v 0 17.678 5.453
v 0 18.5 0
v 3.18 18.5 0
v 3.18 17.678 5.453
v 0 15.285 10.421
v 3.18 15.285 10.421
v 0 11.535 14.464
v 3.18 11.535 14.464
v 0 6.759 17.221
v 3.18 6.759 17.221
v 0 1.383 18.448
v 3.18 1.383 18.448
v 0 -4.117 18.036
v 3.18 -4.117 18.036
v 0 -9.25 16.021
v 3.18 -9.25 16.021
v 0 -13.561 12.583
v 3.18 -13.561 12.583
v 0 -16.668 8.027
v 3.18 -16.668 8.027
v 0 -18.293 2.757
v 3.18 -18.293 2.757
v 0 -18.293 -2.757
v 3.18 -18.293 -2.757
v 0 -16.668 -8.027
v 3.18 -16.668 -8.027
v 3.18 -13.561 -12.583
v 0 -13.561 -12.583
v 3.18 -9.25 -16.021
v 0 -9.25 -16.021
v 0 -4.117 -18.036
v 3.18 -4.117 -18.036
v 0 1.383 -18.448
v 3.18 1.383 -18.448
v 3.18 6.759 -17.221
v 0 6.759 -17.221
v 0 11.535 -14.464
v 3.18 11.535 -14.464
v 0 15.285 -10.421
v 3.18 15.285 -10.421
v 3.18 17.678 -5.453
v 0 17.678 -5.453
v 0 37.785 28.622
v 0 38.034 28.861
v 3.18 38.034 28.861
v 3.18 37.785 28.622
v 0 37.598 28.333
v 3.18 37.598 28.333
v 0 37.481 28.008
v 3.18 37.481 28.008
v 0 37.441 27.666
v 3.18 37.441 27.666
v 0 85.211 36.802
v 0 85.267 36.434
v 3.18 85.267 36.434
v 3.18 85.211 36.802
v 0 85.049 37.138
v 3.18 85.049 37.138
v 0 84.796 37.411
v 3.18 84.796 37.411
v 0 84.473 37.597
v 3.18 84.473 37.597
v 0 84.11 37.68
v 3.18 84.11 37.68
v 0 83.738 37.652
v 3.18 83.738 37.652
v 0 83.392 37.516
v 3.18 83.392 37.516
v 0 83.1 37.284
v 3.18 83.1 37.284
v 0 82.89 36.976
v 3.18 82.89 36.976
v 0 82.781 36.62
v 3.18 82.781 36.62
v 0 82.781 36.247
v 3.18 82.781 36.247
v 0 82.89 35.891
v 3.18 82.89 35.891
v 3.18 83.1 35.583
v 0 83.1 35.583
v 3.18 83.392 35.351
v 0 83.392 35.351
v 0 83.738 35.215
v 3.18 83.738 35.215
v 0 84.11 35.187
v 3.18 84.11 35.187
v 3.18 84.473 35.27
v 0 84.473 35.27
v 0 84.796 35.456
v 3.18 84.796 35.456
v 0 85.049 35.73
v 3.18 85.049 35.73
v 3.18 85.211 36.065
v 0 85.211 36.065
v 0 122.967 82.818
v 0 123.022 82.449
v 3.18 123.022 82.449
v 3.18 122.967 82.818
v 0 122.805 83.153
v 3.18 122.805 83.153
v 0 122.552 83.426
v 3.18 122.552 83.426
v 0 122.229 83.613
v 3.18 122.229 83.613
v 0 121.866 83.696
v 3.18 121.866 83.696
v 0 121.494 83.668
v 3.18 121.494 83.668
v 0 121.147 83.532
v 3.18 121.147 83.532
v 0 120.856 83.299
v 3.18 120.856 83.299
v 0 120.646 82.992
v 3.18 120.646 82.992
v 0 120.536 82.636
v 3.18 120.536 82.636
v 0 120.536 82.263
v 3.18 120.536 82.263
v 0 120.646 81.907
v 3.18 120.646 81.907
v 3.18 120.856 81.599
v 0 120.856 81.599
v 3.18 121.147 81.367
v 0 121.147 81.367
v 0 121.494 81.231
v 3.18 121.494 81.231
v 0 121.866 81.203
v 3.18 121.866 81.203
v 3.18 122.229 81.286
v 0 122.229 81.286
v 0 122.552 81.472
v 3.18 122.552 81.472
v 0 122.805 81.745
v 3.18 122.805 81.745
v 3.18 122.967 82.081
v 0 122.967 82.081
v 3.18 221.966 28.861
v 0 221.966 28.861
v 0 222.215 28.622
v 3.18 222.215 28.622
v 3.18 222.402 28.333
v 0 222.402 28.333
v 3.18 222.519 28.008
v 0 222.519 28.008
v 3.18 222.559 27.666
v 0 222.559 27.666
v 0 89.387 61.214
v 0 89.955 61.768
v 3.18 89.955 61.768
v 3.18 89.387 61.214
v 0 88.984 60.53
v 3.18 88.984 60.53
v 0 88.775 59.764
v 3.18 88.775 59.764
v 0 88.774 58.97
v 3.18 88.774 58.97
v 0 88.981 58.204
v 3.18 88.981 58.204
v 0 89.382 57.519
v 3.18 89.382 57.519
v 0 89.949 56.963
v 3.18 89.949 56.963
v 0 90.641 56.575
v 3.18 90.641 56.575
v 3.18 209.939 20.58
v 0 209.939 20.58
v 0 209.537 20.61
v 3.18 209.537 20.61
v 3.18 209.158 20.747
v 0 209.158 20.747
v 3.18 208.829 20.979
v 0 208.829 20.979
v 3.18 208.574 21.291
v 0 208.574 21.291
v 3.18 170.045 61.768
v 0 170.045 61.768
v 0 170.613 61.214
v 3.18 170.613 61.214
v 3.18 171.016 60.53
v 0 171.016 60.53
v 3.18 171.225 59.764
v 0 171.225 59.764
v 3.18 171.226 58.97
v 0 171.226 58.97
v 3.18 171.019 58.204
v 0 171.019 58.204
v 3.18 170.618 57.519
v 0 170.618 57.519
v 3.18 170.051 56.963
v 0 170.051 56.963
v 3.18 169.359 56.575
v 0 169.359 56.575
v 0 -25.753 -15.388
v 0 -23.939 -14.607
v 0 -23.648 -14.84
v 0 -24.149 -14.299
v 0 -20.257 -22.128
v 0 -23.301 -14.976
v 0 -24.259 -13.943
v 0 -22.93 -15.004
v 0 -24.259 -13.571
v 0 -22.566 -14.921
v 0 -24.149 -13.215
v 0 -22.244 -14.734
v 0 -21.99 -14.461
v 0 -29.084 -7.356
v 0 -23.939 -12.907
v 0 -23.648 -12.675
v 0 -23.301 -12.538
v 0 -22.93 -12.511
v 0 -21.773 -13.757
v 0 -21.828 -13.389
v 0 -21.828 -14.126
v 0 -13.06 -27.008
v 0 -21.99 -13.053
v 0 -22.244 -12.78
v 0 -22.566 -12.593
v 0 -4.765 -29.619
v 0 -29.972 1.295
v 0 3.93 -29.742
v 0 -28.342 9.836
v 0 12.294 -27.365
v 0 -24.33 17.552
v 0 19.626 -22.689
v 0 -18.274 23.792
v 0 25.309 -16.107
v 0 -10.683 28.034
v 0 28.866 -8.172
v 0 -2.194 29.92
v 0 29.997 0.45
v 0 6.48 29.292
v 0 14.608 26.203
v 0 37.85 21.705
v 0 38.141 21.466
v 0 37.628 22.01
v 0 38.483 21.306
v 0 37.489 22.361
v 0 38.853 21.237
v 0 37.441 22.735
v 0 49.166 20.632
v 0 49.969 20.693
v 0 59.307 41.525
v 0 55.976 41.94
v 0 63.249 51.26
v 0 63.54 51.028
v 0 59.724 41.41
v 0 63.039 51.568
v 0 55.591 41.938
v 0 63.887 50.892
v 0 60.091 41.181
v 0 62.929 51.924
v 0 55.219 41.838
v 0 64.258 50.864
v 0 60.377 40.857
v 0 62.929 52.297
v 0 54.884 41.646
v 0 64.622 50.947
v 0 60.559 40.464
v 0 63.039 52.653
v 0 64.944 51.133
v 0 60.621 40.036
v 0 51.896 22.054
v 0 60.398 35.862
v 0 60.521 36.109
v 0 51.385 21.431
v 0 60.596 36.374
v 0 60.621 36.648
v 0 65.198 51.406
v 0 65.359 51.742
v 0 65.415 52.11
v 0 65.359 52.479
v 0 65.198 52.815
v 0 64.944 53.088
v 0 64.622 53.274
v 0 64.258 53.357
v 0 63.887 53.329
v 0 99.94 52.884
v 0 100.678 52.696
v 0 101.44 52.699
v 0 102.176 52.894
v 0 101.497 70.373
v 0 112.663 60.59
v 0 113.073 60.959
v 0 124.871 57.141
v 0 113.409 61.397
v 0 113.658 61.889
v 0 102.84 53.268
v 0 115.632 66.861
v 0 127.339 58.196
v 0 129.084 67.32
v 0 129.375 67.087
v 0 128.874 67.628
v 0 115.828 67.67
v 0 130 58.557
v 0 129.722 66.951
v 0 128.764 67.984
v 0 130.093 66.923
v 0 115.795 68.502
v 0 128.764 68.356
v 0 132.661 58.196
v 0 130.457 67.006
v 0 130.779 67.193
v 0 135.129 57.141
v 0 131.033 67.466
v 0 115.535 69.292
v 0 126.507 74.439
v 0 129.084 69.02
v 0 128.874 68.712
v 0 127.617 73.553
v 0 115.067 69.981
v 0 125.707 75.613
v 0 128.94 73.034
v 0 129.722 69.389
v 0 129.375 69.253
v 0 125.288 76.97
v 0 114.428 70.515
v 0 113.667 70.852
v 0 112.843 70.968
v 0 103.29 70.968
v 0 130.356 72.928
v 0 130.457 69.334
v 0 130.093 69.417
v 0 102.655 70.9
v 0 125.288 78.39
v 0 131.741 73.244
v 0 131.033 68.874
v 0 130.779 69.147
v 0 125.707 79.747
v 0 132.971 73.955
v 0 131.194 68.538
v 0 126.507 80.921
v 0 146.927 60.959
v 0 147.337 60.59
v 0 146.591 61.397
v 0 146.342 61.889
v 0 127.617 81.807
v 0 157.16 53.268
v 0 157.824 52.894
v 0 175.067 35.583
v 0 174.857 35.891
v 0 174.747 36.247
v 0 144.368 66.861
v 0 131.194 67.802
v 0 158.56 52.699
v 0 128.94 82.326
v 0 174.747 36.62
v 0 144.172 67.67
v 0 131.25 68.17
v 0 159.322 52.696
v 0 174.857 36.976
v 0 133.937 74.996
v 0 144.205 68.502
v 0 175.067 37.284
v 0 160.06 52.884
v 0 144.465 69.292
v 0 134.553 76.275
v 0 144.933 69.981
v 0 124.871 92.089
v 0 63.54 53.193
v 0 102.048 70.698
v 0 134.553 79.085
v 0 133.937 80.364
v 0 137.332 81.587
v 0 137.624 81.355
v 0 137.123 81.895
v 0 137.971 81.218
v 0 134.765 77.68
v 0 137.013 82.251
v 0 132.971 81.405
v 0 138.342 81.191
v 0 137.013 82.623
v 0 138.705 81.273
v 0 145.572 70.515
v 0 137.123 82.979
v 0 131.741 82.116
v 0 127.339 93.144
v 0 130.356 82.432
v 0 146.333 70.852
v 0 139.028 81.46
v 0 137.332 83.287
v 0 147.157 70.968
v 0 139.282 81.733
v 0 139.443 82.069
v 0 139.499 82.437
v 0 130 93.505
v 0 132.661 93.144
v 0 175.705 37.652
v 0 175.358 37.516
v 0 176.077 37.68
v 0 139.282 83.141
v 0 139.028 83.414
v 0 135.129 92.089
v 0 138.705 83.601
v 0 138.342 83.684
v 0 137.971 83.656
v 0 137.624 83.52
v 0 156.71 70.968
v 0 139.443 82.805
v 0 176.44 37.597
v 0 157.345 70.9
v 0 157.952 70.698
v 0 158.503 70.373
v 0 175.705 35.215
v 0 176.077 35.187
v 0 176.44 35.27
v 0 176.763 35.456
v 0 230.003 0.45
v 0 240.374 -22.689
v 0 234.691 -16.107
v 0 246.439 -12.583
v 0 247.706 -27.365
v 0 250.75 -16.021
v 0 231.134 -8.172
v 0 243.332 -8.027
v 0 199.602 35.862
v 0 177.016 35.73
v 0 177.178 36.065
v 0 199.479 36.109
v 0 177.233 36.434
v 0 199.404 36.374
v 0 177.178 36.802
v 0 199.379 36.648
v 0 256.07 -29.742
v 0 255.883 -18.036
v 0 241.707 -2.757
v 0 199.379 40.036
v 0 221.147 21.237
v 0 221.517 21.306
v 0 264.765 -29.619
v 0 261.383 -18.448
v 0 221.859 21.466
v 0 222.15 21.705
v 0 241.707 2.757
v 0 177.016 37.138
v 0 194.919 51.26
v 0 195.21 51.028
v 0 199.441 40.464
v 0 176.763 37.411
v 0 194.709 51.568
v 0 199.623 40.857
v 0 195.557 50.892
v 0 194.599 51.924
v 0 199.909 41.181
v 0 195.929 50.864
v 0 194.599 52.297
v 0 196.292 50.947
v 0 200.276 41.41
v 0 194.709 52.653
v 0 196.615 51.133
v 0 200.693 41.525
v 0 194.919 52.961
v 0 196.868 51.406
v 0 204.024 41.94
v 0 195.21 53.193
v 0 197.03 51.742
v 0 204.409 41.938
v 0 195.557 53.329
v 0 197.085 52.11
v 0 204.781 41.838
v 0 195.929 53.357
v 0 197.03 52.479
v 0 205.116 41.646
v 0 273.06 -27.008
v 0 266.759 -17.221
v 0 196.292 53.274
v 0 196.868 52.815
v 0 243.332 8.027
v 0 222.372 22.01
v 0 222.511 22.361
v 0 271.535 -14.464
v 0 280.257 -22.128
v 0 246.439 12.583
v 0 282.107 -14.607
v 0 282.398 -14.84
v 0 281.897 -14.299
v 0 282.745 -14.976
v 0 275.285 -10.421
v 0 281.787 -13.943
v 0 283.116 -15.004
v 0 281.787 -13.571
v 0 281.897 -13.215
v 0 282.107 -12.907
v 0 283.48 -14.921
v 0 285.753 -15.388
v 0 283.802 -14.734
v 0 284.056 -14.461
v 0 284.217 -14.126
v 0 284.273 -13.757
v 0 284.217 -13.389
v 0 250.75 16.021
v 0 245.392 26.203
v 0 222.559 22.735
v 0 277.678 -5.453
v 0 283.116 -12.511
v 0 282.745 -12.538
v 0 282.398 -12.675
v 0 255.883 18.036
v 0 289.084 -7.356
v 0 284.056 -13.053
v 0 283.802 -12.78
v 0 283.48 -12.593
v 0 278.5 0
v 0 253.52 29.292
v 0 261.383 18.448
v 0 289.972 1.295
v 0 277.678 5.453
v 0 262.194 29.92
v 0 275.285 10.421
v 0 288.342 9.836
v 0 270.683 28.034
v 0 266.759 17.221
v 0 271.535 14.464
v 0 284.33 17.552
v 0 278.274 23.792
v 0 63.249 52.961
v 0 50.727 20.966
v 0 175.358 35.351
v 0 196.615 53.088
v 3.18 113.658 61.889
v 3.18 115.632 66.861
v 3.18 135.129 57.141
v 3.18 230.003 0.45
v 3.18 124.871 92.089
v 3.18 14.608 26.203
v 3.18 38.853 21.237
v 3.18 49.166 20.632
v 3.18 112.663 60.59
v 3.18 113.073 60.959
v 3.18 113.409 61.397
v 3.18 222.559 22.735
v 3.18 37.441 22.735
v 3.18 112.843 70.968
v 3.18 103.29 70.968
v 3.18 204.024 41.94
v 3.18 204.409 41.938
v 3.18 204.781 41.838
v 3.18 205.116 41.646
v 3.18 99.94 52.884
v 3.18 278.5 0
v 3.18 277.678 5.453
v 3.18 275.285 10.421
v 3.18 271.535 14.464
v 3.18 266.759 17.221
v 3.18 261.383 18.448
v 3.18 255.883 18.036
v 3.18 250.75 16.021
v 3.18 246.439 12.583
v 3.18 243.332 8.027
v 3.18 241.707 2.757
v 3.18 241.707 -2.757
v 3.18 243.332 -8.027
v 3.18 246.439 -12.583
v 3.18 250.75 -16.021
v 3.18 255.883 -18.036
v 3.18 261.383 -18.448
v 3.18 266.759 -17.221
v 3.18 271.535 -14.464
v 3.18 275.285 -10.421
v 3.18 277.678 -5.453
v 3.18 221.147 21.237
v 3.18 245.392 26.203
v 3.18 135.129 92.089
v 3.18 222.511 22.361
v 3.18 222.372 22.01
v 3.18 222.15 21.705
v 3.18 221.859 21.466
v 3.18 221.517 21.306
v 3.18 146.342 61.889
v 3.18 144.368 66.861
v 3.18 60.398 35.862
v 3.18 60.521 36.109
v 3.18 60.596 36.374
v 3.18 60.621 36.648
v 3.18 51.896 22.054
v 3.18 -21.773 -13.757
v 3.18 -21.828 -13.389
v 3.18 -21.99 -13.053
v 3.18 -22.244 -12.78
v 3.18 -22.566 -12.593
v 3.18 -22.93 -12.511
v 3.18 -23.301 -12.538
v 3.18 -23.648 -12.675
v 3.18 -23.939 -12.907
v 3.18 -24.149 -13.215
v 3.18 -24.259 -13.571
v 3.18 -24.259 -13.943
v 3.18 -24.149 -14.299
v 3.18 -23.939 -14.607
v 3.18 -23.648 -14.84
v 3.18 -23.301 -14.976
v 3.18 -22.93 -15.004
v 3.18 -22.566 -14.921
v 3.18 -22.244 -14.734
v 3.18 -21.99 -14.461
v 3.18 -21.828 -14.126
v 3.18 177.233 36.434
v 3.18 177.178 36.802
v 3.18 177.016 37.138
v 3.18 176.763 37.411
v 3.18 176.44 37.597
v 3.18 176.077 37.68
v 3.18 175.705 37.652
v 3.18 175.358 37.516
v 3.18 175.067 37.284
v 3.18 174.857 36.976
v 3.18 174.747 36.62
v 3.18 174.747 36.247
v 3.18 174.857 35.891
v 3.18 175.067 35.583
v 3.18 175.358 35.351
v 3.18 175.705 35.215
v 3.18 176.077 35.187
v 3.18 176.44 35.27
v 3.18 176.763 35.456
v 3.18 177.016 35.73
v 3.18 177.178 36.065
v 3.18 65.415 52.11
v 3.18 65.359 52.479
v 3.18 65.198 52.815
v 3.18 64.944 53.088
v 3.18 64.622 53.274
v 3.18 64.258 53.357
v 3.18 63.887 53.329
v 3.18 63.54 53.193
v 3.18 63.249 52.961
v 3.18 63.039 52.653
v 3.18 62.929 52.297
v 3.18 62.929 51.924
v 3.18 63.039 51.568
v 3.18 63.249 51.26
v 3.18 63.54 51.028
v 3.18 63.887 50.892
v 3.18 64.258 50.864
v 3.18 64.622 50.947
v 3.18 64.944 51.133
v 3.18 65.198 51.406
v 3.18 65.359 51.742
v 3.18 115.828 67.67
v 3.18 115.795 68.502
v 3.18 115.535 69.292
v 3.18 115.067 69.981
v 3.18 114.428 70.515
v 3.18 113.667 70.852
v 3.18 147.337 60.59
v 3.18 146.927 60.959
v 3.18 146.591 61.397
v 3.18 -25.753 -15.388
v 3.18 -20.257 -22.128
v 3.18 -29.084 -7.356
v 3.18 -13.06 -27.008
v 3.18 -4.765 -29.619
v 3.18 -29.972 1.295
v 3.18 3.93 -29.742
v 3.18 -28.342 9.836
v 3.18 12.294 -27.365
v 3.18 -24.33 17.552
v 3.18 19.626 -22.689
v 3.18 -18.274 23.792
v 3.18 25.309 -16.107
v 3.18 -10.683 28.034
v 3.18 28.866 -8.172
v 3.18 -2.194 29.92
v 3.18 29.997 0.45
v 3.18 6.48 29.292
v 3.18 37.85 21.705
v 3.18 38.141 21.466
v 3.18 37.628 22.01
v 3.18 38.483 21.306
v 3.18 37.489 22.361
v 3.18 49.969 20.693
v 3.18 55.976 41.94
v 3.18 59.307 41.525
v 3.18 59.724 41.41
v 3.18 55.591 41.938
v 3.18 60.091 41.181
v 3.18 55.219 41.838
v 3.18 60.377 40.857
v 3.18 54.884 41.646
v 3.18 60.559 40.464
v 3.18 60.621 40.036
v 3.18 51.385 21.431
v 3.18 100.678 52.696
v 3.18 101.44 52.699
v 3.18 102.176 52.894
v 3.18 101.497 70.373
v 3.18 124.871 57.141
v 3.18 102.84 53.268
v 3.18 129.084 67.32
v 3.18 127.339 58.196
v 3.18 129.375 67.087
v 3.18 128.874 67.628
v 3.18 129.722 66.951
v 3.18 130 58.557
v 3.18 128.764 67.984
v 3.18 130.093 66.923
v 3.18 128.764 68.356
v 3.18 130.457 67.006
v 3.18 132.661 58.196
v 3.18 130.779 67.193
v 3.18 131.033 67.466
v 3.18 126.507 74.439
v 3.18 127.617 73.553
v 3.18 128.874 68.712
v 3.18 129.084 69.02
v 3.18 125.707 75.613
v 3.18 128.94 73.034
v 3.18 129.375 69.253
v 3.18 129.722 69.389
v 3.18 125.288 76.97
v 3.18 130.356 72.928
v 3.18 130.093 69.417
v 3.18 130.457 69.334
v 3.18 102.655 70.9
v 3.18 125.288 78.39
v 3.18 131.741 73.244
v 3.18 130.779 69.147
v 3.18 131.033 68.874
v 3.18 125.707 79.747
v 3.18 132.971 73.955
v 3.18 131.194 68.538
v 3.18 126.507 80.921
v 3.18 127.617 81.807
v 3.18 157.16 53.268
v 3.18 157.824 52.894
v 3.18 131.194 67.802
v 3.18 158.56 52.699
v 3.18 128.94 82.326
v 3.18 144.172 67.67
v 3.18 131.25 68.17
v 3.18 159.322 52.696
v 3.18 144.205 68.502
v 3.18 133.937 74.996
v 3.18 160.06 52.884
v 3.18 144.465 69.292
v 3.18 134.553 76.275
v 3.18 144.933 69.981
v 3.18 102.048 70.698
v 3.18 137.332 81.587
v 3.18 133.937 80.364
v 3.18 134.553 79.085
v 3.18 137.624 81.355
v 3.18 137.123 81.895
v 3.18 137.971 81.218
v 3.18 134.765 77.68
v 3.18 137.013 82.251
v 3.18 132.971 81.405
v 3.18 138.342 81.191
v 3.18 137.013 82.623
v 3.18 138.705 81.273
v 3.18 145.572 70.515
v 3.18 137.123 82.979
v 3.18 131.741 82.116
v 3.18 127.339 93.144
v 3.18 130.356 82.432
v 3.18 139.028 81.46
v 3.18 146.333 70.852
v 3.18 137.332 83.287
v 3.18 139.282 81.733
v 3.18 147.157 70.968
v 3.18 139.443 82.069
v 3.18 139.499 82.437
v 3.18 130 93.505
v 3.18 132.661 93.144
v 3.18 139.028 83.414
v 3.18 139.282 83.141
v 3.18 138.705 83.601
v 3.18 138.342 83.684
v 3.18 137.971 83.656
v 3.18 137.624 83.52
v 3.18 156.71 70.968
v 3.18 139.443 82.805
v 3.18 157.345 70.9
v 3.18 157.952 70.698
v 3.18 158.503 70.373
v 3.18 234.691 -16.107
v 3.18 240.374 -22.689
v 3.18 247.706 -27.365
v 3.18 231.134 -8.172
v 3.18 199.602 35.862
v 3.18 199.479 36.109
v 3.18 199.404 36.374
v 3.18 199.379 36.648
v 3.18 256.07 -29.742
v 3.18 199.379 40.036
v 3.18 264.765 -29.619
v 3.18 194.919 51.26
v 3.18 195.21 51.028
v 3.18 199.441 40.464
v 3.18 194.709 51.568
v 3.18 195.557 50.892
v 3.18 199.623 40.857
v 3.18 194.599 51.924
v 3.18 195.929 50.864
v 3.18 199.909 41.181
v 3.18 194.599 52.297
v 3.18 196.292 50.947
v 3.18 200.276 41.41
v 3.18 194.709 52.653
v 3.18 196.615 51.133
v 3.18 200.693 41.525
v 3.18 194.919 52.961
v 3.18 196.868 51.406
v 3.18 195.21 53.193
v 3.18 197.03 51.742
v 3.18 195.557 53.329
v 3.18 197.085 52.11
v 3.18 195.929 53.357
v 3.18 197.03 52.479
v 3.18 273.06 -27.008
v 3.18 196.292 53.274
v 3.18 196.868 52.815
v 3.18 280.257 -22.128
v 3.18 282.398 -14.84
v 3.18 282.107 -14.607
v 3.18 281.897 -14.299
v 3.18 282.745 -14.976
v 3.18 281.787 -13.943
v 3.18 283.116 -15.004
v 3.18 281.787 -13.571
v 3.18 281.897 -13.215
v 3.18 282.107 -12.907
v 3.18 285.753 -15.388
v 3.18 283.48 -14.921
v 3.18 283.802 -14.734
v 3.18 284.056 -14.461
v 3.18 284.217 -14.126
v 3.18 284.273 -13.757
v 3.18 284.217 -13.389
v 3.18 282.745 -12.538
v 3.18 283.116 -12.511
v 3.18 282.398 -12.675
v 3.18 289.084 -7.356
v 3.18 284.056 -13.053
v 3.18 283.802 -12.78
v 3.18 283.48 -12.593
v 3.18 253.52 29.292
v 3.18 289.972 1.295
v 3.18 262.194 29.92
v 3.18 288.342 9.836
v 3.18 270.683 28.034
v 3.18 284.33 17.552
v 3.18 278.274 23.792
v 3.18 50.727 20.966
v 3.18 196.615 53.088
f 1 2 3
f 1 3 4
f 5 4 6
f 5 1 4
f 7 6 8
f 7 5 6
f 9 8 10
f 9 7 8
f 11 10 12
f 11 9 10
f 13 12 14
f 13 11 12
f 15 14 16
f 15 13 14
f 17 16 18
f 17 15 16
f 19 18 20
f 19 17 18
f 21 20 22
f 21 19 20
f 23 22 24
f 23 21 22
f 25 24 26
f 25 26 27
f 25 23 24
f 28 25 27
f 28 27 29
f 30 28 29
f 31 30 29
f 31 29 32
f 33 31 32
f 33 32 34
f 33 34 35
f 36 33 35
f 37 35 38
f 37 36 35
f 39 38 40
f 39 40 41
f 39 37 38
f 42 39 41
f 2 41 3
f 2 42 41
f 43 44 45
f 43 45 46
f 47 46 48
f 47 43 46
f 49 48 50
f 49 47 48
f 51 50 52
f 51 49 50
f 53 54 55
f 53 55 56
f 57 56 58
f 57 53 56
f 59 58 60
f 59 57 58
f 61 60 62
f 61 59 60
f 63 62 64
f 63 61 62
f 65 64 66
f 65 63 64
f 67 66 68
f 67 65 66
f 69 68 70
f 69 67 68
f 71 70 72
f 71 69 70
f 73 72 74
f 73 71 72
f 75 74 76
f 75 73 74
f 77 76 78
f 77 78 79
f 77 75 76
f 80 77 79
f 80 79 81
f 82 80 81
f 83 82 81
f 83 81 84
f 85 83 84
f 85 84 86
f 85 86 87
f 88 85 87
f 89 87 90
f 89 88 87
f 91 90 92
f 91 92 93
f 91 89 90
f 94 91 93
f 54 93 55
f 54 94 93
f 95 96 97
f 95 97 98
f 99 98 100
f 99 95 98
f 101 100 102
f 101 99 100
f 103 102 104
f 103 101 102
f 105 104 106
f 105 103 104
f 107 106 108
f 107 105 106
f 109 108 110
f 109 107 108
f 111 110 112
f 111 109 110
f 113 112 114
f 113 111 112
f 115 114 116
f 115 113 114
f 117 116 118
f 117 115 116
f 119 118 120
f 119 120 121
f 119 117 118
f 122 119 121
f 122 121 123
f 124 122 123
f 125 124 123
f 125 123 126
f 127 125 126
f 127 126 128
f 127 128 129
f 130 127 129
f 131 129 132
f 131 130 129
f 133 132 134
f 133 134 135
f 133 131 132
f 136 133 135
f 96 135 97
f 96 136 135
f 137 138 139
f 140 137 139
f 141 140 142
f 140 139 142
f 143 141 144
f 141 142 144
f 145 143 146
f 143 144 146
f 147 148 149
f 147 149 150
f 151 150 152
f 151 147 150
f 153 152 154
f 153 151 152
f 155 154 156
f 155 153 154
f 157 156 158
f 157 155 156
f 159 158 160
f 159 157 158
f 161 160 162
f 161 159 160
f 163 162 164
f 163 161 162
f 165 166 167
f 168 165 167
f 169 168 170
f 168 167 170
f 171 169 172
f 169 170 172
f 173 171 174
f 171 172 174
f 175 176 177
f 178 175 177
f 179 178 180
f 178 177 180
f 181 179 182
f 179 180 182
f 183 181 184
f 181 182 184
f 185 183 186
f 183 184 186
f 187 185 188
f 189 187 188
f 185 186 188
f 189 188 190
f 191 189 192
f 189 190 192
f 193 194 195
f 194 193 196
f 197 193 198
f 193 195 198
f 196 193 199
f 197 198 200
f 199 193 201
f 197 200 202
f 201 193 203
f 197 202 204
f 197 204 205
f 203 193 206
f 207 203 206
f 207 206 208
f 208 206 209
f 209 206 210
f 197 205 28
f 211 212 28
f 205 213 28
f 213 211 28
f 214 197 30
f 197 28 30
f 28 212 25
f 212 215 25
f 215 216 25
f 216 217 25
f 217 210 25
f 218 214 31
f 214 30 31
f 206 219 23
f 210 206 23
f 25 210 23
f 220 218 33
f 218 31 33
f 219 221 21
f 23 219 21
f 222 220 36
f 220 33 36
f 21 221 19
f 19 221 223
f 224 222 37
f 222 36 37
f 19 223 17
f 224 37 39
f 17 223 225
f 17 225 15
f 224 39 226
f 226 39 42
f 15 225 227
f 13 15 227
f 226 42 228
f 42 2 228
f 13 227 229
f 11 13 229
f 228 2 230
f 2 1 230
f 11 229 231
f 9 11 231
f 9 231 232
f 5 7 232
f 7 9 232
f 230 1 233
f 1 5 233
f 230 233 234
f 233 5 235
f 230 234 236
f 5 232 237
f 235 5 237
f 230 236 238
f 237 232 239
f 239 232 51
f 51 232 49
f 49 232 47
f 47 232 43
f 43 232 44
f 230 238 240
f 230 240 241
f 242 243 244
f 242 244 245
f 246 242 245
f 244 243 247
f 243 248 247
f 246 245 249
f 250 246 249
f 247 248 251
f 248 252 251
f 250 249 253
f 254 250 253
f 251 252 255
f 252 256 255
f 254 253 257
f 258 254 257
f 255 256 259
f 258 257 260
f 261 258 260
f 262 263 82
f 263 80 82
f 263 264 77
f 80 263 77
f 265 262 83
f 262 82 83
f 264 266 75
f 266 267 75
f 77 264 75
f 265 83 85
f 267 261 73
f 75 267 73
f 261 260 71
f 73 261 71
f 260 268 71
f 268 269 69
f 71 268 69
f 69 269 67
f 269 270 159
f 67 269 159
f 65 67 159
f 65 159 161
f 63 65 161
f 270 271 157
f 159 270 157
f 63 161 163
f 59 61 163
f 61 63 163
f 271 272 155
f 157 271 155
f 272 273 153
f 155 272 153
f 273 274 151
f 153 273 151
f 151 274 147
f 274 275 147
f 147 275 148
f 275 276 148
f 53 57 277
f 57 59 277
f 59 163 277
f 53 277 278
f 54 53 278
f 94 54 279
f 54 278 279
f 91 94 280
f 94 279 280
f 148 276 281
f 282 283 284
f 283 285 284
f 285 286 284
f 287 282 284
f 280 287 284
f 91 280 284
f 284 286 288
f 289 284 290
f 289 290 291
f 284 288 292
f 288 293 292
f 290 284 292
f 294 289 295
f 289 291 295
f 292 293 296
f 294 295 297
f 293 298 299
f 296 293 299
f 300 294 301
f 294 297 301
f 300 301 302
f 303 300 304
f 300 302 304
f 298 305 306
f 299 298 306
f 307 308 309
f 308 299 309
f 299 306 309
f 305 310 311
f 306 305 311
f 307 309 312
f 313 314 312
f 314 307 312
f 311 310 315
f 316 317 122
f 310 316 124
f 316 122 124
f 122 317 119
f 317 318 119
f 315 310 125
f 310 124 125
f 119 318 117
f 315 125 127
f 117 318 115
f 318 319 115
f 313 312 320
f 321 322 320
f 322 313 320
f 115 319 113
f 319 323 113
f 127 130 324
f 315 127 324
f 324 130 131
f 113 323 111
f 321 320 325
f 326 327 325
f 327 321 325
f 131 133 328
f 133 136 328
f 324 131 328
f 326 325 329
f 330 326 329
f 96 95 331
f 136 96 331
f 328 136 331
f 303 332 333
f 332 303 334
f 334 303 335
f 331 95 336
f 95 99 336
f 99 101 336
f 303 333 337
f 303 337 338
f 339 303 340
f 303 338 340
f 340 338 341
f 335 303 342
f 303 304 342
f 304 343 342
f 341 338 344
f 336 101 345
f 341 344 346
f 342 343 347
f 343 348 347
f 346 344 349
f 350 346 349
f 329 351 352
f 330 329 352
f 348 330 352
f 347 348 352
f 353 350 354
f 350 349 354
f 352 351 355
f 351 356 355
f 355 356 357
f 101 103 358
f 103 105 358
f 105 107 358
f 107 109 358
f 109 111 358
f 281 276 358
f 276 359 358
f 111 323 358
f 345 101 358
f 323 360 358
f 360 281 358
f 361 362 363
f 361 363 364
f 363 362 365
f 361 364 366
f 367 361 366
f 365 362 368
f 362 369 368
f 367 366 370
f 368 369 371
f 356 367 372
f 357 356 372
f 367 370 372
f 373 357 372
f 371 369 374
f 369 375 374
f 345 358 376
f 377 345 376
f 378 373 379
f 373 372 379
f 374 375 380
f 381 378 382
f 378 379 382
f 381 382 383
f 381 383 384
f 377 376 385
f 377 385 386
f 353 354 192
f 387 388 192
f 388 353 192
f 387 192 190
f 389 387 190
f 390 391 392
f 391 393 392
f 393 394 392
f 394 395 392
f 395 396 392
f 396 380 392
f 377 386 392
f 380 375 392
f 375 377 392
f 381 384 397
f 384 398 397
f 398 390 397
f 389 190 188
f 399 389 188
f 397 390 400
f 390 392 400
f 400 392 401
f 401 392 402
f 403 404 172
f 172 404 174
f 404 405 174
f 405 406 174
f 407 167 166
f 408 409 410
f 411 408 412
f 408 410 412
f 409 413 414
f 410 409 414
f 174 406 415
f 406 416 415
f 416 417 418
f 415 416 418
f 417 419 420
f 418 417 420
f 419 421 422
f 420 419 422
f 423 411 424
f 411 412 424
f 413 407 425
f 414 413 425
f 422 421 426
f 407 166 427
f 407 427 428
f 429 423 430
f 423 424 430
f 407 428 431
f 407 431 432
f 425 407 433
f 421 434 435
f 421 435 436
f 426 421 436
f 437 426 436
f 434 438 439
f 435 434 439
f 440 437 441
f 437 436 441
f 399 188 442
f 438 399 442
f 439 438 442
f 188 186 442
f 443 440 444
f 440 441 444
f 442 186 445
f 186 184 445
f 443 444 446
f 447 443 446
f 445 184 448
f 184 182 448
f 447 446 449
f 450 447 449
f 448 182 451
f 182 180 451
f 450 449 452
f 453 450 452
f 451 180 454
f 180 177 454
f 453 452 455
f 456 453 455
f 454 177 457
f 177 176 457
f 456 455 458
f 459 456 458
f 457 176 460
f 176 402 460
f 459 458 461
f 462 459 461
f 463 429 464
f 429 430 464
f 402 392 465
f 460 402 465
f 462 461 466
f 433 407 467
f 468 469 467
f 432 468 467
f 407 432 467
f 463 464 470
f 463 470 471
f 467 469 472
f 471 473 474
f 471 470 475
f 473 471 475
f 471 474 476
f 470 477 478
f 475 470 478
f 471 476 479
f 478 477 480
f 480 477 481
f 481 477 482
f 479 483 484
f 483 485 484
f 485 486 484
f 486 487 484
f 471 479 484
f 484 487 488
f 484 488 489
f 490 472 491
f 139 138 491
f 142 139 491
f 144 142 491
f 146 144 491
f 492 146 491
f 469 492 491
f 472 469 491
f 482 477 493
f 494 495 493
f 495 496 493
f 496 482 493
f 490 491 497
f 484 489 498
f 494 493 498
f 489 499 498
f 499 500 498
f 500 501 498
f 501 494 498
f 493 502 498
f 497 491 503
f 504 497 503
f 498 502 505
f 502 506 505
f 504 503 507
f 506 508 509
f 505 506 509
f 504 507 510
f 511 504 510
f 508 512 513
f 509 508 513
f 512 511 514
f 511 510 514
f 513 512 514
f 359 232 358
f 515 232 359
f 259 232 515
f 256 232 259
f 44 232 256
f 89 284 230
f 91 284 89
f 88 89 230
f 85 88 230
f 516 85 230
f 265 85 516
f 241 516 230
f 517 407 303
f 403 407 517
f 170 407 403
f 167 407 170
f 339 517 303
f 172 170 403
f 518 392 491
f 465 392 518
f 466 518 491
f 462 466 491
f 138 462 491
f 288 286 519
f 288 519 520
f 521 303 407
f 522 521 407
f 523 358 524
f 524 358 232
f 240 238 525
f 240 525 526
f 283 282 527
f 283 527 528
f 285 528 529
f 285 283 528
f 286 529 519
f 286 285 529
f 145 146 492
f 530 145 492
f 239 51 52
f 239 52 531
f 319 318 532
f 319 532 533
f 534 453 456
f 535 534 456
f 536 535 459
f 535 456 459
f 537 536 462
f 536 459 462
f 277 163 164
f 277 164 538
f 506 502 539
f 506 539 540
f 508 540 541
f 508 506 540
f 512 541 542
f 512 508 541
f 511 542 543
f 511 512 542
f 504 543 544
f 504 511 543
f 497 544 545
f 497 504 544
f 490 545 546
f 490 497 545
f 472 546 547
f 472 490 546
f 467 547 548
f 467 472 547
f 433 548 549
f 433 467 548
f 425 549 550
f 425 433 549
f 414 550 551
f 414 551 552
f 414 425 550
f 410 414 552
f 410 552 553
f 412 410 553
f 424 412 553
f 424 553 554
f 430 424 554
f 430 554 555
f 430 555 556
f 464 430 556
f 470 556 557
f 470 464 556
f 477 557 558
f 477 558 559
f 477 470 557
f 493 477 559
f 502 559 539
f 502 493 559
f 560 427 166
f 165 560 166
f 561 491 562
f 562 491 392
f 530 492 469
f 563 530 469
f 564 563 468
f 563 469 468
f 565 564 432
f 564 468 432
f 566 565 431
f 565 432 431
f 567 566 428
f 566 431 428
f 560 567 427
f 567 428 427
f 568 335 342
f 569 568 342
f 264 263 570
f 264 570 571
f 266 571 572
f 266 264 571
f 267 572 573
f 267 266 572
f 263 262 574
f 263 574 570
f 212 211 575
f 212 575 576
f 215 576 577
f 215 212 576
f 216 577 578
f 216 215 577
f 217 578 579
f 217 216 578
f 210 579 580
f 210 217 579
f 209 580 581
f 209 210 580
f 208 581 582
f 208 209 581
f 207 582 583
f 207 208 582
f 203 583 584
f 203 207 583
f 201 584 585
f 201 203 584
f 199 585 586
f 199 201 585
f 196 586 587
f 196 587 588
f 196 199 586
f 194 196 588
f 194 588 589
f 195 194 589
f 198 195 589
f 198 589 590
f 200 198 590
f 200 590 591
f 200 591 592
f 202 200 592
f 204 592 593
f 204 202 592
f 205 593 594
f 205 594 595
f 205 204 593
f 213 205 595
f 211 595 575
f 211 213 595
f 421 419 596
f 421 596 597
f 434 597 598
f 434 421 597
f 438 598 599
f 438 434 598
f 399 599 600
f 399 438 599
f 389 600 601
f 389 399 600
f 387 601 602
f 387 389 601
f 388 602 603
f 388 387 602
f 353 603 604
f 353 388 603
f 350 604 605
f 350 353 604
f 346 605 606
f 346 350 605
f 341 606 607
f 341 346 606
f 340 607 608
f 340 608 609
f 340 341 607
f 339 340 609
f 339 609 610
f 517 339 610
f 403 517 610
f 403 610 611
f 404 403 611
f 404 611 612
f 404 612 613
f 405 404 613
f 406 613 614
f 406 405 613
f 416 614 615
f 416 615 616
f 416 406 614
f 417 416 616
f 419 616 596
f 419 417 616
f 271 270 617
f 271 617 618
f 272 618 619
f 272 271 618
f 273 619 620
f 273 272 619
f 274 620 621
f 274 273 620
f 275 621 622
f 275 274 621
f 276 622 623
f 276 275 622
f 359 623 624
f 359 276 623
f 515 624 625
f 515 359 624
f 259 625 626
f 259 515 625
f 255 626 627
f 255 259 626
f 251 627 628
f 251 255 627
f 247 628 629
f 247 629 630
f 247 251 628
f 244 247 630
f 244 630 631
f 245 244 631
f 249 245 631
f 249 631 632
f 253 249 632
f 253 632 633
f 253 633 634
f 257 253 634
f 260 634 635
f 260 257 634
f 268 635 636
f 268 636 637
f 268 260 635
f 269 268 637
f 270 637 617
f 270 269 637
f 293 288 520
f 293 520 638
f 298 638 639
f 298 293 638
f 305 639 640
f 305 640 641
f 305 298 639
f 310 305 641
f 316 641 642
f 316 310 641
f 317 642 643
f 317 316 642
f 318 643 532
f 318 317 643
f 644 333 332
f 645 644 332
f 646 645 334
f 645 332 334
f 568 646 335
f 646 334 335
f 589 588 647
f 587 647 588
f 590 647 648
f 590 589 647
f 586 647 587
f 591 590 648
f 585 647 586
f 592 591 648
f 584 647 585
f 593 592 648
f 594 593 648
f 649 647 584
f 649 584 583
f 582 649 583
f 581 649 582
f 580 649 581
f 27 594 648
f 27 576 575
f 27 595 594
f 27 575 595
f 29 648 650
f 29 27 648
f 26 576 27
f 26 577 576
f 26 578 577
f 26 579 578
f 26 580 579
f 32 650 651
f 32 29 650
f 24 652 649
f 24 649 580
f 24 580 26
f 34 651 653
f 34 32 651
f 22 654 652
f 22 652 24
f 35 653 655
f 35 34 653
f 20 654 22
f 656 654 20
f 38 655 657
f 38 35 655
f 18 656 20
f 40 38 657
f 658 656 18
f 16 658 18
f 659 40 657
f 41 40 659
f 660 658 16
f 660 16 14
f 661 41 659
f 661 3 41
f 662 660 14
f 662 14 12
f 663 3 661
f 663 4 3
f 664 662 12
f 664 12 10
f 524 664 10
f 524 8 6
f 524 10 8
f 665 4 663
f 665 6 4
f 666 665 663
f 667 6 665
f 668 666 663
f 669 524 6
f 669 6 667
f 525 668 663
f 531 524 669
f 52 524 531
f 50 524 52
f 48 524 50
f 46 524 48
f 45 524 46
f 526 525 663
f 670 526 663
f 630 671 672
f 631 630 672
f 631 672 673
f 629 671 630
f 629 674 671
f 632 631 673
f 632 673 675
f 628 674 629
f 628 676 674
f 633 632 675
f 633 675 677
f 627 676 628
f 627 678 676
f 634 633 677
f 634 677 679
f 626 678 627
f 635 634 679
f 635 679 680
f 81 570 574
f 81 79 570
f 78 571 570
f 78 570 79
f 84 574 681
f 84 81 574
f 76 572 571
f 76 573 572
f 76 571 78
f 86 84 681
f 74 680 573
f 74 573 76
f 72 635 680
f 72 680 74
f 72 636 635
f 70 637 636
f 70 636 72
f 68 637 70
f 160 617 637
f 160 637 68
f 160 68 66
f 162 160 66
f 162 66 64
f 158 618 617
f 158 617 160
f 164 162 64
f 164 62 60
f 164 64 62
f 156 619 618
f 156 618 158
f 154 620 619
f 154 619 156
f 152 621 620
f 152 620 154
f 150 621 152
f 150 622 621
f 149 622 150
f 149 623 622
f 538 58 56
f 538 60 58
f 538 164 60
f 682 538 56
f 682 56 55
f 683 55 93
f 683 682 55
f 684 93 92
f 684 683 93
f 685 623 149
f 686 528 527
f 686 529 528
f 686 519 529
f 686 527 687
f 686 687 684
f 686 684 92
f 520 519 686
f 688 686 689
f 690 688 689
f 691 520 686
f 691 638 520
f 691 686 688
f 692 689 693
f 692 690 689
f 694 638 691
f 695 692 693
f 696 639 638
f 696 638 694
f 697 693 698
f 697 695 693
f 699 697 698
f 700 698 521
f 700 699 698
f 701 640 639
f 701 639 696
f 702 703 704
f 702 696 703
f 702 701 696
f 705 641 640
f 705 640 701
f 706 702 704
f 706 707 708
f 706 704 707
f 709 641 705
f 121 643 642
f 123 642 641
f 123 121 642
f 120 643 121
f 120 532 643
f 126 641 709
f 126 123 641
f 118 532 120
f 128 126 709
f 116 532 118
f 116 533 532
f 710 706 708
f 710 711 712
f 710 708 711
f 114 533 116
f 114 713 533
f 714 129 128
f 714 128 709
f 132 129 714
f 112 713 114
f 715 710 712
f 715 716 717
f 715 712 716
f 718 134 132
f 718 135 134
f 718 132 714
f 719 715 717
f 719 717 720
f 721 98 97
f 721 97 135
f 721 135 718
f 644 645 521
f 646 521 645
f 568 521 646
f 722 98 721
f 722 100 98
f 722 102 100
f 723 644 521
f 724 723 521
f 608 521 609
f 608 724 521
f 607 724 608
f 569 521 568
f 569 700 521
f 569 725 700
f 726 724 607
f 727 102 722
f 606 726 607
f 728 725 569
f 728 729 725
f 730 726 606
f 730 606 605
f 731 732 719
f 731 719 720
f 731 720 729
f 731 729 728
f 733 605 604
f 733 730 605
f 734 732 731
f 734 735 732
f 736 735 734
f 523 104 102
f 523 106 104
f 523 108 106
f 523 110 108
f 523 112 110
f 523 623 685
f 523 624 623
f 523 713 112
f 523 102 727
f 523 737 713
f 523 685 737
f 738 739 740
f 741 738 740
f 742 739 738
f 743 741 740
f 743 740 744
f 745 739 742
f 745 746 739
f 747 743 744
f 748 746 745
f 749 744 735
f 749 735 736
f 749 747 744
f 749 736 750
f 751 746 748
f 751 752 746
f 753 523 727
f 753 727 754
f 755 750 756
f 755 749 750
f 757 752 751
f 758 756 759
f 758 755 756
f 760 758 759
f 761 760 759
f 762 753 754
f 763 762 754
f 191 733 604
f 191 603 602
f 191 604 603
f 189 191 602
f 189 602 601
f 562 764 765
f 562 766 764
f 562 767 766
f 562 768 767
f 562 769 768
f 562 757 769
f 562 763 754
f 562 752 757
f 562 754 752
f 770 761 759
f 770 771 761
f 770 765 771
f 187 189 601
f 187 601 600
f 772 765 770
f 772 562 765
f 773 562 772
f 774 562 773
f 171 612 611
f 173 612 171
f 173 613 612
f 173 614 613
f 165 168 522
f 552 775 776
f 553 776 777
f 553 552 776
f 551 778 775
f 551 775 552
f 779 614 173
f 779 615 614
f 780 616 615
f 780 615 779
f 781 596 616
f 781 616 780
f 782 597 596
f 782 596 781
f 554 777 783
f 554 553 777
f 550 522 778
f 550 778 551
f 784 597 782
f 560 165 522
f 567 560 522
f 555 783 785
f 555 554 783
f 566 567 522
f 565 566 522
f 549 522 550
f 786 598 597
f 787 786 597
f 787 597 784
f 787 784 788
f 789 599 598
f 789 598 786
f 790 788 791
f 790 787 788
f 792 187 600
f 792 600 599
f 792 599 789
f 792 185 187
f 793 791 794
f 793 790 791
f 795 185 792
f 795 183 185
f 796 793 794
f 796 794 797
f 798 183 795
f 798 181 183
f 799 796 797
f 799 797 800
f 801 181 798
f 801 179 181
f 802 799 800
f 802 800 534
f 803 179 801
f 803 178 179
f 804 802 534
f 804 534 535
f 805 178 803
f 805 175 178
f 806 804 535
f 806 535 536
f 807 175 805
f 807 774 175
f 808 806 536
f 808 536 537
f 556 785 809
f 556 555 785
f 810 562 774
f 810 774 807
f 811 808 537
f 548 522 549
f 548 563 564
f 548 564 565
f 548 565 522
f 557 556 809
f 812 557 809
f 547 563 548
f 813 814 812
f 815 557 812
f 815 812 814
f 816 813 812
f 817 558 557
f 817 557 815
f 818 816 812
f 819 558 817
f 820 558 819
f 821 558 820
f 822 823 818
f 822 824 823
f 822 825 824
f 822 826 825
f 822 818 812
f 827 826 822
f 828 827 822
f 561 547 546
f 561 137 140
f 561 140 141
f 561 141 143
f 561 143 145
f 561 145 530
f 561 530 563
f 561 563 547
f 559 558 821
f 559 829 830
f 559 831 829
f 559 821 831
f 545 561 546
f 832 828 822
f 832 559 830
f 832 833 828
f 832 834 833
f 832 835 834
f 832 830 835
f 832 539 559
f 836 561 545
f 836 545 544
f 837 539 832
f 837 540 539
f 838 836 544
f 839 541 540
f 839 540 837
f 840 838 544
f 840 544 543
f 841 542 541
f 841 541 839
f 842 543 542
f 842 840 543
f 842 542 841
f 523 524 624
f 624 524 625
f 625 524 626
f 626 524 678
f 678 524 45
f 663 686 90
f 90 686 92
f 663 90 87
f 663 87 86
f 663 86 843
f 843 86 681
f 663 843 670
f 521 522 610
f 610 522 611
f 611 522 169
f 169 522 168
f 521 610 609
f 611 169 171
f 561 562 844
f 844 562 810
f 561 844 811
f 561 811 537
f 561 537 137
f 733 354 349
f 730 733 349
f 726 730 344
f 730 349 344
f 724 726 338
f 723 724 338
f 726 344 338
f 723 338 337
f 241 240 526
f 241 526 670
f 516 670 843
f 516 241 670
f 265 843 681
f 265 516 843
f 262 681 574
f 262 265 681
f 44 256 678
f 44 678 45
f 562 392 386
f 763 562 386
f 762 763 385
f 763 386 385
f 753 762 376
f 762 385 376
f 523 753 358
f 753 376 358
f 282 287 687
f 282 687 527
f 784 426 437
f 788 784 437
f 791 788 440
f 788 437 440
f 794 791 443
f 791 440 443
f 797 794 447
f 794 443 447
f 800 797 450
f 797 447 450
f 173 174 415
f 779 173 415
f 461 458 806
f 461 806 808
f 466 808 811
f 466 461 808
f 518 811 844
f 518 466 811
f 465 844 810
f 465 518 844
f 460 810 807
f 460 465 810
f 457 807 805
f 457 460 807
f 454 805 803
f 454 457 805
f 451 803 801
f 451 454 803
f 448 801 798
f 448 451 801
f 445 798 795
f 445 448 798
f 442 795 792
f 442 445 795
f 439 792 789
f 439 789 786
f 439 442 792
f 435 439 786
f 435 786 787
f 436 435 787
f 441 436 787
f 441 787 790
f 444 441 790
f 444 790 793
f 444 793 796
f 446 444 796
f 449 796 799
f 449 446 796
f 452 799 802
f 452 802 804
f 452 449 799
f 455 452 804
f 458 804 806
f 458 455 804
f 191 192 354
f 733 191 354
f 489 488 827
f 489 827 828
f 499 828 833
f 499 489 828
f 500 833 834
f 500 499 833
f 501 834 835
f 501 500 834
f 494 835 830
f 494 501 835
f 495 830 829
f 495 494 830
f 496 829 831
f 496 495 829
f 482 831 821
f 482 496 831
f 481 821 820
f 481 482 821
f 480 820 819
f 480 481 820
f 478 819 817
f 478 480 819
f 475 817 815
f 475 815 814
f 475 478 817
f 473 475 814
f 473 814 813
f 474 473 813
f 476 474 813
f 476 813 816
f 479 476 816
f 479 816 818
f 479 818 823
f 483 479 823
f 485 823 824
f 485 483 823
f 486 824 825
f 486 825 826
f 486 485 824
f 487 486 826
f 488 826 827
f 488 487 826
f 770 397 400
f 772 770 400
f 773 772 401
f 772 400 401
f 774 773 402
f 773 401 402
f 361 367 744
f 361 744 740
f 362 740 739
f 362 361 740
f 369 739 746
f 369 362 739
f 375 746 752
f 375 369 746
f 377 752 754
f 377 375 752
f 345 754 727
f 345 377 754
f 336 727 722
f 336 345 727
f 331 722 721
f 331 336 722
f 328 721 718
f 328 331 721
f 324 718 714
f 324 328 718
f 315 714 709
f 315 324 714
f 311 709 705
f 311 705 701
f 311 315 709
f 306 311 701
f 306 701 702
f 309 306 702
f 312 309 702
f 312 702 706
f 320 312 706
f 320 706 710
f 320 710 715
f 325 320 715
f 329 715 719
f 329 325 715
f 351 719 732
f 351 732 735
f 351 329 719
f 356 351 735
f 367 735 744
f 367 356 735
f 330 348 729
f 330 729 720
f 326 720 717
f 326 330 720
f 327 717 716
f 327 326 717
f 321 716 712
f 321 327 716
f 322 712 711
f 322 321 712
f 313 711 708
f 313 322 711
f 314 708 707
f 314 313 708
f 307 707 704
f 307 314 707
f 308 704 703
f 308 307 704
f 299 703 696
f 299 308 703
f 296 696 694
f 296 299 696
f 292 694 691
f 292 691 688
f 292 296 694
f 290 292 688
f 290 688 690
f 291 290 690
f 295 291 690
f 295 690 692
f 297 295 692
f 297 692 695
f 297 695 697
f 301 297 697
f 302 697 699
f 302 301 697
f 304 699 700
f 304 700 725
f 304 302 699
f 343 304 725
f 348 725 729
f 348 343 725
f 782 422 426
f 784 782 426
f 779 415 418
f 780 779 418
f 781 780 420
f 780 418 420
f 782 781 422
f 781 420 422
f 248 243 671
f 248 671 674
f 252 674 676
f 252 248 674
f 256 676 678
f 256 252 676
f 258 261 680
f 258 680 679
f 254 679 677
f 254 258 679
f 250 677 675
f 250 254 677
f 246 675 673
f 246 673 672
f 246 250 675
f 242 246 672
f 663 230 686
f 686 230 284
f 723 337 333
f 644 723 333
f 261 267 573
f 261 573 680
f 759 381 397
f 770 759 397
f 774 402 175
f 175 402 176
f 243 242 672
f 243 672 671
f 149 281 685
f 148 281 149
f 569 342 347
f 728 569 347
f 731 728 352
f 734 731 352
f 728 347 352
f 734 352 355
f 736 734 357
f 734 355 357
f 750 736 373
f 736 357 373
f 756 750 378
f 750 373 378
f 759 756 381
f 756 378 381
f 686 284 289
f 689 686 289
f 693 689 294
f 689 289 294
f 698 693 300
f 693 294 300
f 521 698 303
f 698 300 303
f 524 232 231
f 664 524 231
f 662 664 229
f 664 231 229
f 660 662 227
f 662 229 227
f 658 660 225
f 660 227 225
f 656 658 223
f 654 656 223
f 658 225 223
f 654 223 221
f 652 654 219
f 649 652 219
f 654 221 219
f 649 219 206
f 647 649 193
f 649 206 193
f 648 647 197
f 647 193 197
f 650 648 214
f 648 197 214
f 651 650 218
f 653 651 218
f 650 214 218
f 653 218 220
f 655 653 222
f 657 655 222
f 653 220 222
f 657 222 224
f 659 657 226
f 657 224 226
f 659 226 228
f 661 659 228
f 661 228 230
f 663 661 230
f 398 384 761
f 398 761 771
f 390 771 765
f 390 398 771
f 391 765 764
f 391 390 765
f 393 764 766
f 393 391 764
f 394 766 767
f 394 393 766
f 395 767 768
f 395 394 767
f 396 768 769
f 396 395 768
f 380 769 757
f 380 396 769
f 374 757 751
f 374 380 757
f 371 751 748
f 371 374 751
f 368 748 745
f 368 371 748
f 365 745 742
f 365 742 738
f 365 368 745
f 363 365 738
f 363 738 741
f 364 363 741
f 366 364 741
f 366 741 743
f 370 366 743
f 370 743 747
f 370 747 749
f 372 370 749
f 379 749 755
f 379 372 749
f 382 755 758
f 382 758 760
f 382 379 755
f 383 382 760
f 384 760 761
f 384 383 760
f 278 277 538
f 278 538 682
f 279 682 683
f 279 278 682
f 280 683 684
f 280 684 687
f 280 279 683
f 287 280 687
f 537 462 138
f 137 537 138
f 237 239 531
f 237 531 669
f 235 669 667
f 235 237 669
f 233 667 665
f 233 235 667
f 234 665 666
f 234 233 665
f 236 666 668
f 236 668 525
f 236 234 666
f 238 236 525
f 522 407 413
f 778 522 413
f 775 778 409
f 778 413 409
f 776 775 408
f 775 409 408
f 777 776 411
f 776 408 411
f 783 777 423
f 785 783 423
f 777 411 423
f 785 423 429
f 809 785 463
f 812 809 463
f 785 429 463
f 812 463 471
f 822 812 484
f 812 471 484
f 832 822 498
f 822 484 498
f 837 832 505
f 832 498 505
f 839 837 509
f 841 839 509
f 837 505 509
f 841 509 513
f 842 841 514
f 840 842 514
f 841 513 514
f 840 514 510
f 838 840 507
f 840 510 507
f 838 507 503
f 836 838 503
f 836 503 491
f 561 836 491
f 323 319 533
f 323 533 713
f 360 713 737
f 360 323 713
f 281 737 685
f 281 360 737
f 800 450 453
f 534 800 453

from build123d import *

# Parameters (mm, degrees)
EXTRUDE_BASE_DEPTH         = 3.18
SKETCH4_R                  = 18.5
CUT_MOTOR_HOLES_DEPTH      = 3.18
SKETCH6_R                  = 1.25
SKETCH6_R_2                = 4.765
SUPPORT_HOLES_DEPTH        = 3.18
CUT_LIGHTENING_HOLES_DEPTH = 3.18


with BuildPart() as part:
    # bogie base → extrude-base (new body)
    with BuildSketch(Plane.YZ):
        with BuildLine():
            Line((124.870587973, 92.088866631), (14.608385018, 26.202959511))
            ThreePointArc((14.608385018, 26.202959511), (-25.75271229, -15.388236082), (29.9966211, 0.450247222))
            Line((29.9966211, 0.450247222), (124.870587973, 57.141091426))
            ThreePointArc((124.870587973, 57.141091426), (130, 58.556853997), (135.129412027, 57.141091426))
            Line((135.129412027, 57.141091426), (230.0033789, 0.450247222))
            ThreePointArc((230.0033789, 0.450247222), (285.75271229, -15.388236082), (245.391614982, 26.202959511))
            Line((245.391614982, 26.202959511), (135.129412027, 92.088866631))
            ThreePointArc((135.129412027, 92.088866631), (130, 93.504629201), (124.870587973, 92.088866631))
        make_face()
    extrude(amount=EXTRUDE_BASE_DEPTH)

    # Sketch4 → Cut-motor holes (cut)
    with BuildSketch(Plane.YZ):
        with Locations((260, 0)):
            Circle(SKETCH4_R)
        Circle(SKETCH4_R)
    extrude(amount=CUT_MOTOR_HOLES_DEPTH, mode=Mode.SUBTRACT)

    # Sketch6 → support holes (cut)
    with BuildSketch(Plane.YZ):
        with Locations((64.164835578, 52.110380567)):
            Circle(SKETCH6_R)
        with Locations((84.016579298, 36.433714107)):
            Circle(SKETCH6_R)
        with Locations((130, 77.68)):
            Circle(SKETCH6_R_2)
        with Locations((130, 68.17)):
            Circle(SKETCH6_R)
        with Locations((121.77231361, 82.449200841)):
            Circle(SKETCH6_R)
        with Locations((138.248750332, 82.43704307)):
            Circle(SKETCH6_R)
        with Locations((175.983420702, 36.433714107)):
            Circle(SKETCH6_R)
        with Locations((195.835164422, 52.110380567)):
            Circle(SKETCH6_R)
        with Locations((-23.022924787, -13.757083057)):
            Circle(SKETCH6_R)
        with Locations((283.022924787, -13.757083057)):
            Circle(SKETCH6_R)
    extrude(amount=SUPPORT_HOLES_DEPTH, mode=Mode.SUBTRACT)

    # Sketch7 → Cut-lightening holes (cut)
    with BuildSketch(Plane.YZ):
        with BuildLine():
            Line((54.884000108, 41.646401467), (38.03439682, 28.860792879))
            ThreePointArc((38.03439682, 28.860792879), (37.597600164, 28.332915929), (37.441118366, 27.665863577))
            Line((37.441118366, 27.665863577), (37.441118366, 22.734591544))
            ThreePointArc((37.441118366, 22.734591544), (37.849837551, 21.705462697), (38.853259944, 21.237166789))
            Line((38.853259944, 21.237166789), (49.165938422, 20.63209087))
            ThreePointArc((49.165938422, 20.63209087), (50.727348318, 20.966140733), (51.896208282, 22.053962665))
            Line((51.896208282, 22.053962665), (60.398420976, 35.861757183))
            ThreePointArc((60.398420976, 35.861757183), (60.564389902, 36.239537563), (60.621144468, 36.64824604))
            Line((60.621144468, 36.64824604), (60.621144468, 40.036157787))
            ThreePointArc((60.621144468, 40.036157787), (60.245516663, 41.02902594), (59.306761578, 41.524628912))
            Line((59.306761578, 41.524628912), (55.976338764, 41.939943289))
            ThreePointArc((55.976338764, 41.939943289), (55.401440776, 41.900078528), (54.884000108, 41.646401467))
        make_face()
        with BuildLine():
            Line((200.693238422, 41.524628912), (204.023661236, 41.939943289))
            ThreePointArc((204.023661236, 41.939943289), (204.598559224, 41.900078528), (205.115999892, 41.646401467))
            Line((205.115999892, 41.646401467), (221.96560318, 28.860792879))
            ThreePointArc((221.96560318, 28.860792879), (222.402399836, 28.332915929), (222.558881634, 27.665863577))
            Line((222.558881634, 27.665863577), (222.558881634, 22.734591544))
            ThreePointArc((222.558881634, 22.734591544), (222.150162449, 21.705462697), (221.146740056, 21.237166789))
            Line((221.146740056, 21.237166789), (209.939024731, 20.579576362))
            ThreePointArc((209.939024731, 20.579576362), (209.158319783, 20.746601293), (208.573889801, 21.290512259))
            Line((208.573889801, 21.290512259), (199.601579024, 35.861757183))
            ThreePointArc((199.601579024, 35.861757183), (199.435610098, 36.239537563), (199.378855532, 36.64824604))
            Line((199.378855532, 36.64824604), (199.378855532, 40.036157787))
            ThreePointArc((199.378855532, 40.036157787), (199.754483337, 41.02902594), (200.693238422, 41.524628912))
        make_face()
        with BuildLine():
            Line((112.843083605, 70.967653341), (103.290433505, 70.967653341))
            ThreePointArc((103.290433505, 70.967653341), (102.345892271, 70.815080576), (101.497425215, 70.372881245))
            Line((101.497425215, 70.372881245), (89.954993447, 61.768426002))
            ThreePointArc((89.954993447, 61.768426002), (88.773863738, 58.970129198), (90.641401413, 56.574751268))
            Line((90.641401413, 56.574751268), (99.94028895, 52.884470408))
            ThreePointArc((99.94028895, 52.884470408), (101.439958174, 52.698779238), (102.839897564, 53.267689334))
            Line((102.839897564, 53.267689334), (112.662933935, 60.59039901))
            ThreePointArc((112.662933935, 60.59039901), (113.250900477, 61.170535451), (113.658372475, 61.88902659))
            Line((113.658372475, 61.88902659), (115.631530434, 66.861053016))
            ThreePointArc((115.631530434, 66.861053016), (115.324998286, 69.65291282), (112.843083605, 70.967653341))
        make_face()
        with BuildLine():
            Line((146.341627525, 61.88902659), (144.368469566, 66.861053016))
            ThreePointArc((144.368469566, 66.861053016), (144.675001714, 69.65291282), (147.156916395, 70.967653341))
            Line((147.156916395, 70.967653341), (156.709566495, 70.967653341))
            ThreePointArc((156.709566495, 70.967653341), (157.654107729, 70.815080576), (158.502574785, 70.372881245))
            Line((158.502574785, 70.372881245), (170.045006553, 61.768426002))
            ThreePointArc((170.045006553, 61.768426002), (171.226136262, 58.970129198), (169.358598587, 56.574751268))
            Line((169.358598587, 56.574751268), (160.05971105, 52.884470408))
            ThreePointArc((160.05971105, 52.884470408), (158.560041826, 52.698779238), (157.160102436, 53.267689334))
            Line((157.160102436, 53.267689334), (147.337066065, 60.59039901))
            ThreePointArc((147.337066065, 60.59039901), (146.749099523, 61.170535451), (146.341627525, 61.88902659))
        make_face()
    extrude(amount=CUT_LIGHTENING_HOLES_DEPTH, mode=Mode.SUBTRACT)


solid = part.part
